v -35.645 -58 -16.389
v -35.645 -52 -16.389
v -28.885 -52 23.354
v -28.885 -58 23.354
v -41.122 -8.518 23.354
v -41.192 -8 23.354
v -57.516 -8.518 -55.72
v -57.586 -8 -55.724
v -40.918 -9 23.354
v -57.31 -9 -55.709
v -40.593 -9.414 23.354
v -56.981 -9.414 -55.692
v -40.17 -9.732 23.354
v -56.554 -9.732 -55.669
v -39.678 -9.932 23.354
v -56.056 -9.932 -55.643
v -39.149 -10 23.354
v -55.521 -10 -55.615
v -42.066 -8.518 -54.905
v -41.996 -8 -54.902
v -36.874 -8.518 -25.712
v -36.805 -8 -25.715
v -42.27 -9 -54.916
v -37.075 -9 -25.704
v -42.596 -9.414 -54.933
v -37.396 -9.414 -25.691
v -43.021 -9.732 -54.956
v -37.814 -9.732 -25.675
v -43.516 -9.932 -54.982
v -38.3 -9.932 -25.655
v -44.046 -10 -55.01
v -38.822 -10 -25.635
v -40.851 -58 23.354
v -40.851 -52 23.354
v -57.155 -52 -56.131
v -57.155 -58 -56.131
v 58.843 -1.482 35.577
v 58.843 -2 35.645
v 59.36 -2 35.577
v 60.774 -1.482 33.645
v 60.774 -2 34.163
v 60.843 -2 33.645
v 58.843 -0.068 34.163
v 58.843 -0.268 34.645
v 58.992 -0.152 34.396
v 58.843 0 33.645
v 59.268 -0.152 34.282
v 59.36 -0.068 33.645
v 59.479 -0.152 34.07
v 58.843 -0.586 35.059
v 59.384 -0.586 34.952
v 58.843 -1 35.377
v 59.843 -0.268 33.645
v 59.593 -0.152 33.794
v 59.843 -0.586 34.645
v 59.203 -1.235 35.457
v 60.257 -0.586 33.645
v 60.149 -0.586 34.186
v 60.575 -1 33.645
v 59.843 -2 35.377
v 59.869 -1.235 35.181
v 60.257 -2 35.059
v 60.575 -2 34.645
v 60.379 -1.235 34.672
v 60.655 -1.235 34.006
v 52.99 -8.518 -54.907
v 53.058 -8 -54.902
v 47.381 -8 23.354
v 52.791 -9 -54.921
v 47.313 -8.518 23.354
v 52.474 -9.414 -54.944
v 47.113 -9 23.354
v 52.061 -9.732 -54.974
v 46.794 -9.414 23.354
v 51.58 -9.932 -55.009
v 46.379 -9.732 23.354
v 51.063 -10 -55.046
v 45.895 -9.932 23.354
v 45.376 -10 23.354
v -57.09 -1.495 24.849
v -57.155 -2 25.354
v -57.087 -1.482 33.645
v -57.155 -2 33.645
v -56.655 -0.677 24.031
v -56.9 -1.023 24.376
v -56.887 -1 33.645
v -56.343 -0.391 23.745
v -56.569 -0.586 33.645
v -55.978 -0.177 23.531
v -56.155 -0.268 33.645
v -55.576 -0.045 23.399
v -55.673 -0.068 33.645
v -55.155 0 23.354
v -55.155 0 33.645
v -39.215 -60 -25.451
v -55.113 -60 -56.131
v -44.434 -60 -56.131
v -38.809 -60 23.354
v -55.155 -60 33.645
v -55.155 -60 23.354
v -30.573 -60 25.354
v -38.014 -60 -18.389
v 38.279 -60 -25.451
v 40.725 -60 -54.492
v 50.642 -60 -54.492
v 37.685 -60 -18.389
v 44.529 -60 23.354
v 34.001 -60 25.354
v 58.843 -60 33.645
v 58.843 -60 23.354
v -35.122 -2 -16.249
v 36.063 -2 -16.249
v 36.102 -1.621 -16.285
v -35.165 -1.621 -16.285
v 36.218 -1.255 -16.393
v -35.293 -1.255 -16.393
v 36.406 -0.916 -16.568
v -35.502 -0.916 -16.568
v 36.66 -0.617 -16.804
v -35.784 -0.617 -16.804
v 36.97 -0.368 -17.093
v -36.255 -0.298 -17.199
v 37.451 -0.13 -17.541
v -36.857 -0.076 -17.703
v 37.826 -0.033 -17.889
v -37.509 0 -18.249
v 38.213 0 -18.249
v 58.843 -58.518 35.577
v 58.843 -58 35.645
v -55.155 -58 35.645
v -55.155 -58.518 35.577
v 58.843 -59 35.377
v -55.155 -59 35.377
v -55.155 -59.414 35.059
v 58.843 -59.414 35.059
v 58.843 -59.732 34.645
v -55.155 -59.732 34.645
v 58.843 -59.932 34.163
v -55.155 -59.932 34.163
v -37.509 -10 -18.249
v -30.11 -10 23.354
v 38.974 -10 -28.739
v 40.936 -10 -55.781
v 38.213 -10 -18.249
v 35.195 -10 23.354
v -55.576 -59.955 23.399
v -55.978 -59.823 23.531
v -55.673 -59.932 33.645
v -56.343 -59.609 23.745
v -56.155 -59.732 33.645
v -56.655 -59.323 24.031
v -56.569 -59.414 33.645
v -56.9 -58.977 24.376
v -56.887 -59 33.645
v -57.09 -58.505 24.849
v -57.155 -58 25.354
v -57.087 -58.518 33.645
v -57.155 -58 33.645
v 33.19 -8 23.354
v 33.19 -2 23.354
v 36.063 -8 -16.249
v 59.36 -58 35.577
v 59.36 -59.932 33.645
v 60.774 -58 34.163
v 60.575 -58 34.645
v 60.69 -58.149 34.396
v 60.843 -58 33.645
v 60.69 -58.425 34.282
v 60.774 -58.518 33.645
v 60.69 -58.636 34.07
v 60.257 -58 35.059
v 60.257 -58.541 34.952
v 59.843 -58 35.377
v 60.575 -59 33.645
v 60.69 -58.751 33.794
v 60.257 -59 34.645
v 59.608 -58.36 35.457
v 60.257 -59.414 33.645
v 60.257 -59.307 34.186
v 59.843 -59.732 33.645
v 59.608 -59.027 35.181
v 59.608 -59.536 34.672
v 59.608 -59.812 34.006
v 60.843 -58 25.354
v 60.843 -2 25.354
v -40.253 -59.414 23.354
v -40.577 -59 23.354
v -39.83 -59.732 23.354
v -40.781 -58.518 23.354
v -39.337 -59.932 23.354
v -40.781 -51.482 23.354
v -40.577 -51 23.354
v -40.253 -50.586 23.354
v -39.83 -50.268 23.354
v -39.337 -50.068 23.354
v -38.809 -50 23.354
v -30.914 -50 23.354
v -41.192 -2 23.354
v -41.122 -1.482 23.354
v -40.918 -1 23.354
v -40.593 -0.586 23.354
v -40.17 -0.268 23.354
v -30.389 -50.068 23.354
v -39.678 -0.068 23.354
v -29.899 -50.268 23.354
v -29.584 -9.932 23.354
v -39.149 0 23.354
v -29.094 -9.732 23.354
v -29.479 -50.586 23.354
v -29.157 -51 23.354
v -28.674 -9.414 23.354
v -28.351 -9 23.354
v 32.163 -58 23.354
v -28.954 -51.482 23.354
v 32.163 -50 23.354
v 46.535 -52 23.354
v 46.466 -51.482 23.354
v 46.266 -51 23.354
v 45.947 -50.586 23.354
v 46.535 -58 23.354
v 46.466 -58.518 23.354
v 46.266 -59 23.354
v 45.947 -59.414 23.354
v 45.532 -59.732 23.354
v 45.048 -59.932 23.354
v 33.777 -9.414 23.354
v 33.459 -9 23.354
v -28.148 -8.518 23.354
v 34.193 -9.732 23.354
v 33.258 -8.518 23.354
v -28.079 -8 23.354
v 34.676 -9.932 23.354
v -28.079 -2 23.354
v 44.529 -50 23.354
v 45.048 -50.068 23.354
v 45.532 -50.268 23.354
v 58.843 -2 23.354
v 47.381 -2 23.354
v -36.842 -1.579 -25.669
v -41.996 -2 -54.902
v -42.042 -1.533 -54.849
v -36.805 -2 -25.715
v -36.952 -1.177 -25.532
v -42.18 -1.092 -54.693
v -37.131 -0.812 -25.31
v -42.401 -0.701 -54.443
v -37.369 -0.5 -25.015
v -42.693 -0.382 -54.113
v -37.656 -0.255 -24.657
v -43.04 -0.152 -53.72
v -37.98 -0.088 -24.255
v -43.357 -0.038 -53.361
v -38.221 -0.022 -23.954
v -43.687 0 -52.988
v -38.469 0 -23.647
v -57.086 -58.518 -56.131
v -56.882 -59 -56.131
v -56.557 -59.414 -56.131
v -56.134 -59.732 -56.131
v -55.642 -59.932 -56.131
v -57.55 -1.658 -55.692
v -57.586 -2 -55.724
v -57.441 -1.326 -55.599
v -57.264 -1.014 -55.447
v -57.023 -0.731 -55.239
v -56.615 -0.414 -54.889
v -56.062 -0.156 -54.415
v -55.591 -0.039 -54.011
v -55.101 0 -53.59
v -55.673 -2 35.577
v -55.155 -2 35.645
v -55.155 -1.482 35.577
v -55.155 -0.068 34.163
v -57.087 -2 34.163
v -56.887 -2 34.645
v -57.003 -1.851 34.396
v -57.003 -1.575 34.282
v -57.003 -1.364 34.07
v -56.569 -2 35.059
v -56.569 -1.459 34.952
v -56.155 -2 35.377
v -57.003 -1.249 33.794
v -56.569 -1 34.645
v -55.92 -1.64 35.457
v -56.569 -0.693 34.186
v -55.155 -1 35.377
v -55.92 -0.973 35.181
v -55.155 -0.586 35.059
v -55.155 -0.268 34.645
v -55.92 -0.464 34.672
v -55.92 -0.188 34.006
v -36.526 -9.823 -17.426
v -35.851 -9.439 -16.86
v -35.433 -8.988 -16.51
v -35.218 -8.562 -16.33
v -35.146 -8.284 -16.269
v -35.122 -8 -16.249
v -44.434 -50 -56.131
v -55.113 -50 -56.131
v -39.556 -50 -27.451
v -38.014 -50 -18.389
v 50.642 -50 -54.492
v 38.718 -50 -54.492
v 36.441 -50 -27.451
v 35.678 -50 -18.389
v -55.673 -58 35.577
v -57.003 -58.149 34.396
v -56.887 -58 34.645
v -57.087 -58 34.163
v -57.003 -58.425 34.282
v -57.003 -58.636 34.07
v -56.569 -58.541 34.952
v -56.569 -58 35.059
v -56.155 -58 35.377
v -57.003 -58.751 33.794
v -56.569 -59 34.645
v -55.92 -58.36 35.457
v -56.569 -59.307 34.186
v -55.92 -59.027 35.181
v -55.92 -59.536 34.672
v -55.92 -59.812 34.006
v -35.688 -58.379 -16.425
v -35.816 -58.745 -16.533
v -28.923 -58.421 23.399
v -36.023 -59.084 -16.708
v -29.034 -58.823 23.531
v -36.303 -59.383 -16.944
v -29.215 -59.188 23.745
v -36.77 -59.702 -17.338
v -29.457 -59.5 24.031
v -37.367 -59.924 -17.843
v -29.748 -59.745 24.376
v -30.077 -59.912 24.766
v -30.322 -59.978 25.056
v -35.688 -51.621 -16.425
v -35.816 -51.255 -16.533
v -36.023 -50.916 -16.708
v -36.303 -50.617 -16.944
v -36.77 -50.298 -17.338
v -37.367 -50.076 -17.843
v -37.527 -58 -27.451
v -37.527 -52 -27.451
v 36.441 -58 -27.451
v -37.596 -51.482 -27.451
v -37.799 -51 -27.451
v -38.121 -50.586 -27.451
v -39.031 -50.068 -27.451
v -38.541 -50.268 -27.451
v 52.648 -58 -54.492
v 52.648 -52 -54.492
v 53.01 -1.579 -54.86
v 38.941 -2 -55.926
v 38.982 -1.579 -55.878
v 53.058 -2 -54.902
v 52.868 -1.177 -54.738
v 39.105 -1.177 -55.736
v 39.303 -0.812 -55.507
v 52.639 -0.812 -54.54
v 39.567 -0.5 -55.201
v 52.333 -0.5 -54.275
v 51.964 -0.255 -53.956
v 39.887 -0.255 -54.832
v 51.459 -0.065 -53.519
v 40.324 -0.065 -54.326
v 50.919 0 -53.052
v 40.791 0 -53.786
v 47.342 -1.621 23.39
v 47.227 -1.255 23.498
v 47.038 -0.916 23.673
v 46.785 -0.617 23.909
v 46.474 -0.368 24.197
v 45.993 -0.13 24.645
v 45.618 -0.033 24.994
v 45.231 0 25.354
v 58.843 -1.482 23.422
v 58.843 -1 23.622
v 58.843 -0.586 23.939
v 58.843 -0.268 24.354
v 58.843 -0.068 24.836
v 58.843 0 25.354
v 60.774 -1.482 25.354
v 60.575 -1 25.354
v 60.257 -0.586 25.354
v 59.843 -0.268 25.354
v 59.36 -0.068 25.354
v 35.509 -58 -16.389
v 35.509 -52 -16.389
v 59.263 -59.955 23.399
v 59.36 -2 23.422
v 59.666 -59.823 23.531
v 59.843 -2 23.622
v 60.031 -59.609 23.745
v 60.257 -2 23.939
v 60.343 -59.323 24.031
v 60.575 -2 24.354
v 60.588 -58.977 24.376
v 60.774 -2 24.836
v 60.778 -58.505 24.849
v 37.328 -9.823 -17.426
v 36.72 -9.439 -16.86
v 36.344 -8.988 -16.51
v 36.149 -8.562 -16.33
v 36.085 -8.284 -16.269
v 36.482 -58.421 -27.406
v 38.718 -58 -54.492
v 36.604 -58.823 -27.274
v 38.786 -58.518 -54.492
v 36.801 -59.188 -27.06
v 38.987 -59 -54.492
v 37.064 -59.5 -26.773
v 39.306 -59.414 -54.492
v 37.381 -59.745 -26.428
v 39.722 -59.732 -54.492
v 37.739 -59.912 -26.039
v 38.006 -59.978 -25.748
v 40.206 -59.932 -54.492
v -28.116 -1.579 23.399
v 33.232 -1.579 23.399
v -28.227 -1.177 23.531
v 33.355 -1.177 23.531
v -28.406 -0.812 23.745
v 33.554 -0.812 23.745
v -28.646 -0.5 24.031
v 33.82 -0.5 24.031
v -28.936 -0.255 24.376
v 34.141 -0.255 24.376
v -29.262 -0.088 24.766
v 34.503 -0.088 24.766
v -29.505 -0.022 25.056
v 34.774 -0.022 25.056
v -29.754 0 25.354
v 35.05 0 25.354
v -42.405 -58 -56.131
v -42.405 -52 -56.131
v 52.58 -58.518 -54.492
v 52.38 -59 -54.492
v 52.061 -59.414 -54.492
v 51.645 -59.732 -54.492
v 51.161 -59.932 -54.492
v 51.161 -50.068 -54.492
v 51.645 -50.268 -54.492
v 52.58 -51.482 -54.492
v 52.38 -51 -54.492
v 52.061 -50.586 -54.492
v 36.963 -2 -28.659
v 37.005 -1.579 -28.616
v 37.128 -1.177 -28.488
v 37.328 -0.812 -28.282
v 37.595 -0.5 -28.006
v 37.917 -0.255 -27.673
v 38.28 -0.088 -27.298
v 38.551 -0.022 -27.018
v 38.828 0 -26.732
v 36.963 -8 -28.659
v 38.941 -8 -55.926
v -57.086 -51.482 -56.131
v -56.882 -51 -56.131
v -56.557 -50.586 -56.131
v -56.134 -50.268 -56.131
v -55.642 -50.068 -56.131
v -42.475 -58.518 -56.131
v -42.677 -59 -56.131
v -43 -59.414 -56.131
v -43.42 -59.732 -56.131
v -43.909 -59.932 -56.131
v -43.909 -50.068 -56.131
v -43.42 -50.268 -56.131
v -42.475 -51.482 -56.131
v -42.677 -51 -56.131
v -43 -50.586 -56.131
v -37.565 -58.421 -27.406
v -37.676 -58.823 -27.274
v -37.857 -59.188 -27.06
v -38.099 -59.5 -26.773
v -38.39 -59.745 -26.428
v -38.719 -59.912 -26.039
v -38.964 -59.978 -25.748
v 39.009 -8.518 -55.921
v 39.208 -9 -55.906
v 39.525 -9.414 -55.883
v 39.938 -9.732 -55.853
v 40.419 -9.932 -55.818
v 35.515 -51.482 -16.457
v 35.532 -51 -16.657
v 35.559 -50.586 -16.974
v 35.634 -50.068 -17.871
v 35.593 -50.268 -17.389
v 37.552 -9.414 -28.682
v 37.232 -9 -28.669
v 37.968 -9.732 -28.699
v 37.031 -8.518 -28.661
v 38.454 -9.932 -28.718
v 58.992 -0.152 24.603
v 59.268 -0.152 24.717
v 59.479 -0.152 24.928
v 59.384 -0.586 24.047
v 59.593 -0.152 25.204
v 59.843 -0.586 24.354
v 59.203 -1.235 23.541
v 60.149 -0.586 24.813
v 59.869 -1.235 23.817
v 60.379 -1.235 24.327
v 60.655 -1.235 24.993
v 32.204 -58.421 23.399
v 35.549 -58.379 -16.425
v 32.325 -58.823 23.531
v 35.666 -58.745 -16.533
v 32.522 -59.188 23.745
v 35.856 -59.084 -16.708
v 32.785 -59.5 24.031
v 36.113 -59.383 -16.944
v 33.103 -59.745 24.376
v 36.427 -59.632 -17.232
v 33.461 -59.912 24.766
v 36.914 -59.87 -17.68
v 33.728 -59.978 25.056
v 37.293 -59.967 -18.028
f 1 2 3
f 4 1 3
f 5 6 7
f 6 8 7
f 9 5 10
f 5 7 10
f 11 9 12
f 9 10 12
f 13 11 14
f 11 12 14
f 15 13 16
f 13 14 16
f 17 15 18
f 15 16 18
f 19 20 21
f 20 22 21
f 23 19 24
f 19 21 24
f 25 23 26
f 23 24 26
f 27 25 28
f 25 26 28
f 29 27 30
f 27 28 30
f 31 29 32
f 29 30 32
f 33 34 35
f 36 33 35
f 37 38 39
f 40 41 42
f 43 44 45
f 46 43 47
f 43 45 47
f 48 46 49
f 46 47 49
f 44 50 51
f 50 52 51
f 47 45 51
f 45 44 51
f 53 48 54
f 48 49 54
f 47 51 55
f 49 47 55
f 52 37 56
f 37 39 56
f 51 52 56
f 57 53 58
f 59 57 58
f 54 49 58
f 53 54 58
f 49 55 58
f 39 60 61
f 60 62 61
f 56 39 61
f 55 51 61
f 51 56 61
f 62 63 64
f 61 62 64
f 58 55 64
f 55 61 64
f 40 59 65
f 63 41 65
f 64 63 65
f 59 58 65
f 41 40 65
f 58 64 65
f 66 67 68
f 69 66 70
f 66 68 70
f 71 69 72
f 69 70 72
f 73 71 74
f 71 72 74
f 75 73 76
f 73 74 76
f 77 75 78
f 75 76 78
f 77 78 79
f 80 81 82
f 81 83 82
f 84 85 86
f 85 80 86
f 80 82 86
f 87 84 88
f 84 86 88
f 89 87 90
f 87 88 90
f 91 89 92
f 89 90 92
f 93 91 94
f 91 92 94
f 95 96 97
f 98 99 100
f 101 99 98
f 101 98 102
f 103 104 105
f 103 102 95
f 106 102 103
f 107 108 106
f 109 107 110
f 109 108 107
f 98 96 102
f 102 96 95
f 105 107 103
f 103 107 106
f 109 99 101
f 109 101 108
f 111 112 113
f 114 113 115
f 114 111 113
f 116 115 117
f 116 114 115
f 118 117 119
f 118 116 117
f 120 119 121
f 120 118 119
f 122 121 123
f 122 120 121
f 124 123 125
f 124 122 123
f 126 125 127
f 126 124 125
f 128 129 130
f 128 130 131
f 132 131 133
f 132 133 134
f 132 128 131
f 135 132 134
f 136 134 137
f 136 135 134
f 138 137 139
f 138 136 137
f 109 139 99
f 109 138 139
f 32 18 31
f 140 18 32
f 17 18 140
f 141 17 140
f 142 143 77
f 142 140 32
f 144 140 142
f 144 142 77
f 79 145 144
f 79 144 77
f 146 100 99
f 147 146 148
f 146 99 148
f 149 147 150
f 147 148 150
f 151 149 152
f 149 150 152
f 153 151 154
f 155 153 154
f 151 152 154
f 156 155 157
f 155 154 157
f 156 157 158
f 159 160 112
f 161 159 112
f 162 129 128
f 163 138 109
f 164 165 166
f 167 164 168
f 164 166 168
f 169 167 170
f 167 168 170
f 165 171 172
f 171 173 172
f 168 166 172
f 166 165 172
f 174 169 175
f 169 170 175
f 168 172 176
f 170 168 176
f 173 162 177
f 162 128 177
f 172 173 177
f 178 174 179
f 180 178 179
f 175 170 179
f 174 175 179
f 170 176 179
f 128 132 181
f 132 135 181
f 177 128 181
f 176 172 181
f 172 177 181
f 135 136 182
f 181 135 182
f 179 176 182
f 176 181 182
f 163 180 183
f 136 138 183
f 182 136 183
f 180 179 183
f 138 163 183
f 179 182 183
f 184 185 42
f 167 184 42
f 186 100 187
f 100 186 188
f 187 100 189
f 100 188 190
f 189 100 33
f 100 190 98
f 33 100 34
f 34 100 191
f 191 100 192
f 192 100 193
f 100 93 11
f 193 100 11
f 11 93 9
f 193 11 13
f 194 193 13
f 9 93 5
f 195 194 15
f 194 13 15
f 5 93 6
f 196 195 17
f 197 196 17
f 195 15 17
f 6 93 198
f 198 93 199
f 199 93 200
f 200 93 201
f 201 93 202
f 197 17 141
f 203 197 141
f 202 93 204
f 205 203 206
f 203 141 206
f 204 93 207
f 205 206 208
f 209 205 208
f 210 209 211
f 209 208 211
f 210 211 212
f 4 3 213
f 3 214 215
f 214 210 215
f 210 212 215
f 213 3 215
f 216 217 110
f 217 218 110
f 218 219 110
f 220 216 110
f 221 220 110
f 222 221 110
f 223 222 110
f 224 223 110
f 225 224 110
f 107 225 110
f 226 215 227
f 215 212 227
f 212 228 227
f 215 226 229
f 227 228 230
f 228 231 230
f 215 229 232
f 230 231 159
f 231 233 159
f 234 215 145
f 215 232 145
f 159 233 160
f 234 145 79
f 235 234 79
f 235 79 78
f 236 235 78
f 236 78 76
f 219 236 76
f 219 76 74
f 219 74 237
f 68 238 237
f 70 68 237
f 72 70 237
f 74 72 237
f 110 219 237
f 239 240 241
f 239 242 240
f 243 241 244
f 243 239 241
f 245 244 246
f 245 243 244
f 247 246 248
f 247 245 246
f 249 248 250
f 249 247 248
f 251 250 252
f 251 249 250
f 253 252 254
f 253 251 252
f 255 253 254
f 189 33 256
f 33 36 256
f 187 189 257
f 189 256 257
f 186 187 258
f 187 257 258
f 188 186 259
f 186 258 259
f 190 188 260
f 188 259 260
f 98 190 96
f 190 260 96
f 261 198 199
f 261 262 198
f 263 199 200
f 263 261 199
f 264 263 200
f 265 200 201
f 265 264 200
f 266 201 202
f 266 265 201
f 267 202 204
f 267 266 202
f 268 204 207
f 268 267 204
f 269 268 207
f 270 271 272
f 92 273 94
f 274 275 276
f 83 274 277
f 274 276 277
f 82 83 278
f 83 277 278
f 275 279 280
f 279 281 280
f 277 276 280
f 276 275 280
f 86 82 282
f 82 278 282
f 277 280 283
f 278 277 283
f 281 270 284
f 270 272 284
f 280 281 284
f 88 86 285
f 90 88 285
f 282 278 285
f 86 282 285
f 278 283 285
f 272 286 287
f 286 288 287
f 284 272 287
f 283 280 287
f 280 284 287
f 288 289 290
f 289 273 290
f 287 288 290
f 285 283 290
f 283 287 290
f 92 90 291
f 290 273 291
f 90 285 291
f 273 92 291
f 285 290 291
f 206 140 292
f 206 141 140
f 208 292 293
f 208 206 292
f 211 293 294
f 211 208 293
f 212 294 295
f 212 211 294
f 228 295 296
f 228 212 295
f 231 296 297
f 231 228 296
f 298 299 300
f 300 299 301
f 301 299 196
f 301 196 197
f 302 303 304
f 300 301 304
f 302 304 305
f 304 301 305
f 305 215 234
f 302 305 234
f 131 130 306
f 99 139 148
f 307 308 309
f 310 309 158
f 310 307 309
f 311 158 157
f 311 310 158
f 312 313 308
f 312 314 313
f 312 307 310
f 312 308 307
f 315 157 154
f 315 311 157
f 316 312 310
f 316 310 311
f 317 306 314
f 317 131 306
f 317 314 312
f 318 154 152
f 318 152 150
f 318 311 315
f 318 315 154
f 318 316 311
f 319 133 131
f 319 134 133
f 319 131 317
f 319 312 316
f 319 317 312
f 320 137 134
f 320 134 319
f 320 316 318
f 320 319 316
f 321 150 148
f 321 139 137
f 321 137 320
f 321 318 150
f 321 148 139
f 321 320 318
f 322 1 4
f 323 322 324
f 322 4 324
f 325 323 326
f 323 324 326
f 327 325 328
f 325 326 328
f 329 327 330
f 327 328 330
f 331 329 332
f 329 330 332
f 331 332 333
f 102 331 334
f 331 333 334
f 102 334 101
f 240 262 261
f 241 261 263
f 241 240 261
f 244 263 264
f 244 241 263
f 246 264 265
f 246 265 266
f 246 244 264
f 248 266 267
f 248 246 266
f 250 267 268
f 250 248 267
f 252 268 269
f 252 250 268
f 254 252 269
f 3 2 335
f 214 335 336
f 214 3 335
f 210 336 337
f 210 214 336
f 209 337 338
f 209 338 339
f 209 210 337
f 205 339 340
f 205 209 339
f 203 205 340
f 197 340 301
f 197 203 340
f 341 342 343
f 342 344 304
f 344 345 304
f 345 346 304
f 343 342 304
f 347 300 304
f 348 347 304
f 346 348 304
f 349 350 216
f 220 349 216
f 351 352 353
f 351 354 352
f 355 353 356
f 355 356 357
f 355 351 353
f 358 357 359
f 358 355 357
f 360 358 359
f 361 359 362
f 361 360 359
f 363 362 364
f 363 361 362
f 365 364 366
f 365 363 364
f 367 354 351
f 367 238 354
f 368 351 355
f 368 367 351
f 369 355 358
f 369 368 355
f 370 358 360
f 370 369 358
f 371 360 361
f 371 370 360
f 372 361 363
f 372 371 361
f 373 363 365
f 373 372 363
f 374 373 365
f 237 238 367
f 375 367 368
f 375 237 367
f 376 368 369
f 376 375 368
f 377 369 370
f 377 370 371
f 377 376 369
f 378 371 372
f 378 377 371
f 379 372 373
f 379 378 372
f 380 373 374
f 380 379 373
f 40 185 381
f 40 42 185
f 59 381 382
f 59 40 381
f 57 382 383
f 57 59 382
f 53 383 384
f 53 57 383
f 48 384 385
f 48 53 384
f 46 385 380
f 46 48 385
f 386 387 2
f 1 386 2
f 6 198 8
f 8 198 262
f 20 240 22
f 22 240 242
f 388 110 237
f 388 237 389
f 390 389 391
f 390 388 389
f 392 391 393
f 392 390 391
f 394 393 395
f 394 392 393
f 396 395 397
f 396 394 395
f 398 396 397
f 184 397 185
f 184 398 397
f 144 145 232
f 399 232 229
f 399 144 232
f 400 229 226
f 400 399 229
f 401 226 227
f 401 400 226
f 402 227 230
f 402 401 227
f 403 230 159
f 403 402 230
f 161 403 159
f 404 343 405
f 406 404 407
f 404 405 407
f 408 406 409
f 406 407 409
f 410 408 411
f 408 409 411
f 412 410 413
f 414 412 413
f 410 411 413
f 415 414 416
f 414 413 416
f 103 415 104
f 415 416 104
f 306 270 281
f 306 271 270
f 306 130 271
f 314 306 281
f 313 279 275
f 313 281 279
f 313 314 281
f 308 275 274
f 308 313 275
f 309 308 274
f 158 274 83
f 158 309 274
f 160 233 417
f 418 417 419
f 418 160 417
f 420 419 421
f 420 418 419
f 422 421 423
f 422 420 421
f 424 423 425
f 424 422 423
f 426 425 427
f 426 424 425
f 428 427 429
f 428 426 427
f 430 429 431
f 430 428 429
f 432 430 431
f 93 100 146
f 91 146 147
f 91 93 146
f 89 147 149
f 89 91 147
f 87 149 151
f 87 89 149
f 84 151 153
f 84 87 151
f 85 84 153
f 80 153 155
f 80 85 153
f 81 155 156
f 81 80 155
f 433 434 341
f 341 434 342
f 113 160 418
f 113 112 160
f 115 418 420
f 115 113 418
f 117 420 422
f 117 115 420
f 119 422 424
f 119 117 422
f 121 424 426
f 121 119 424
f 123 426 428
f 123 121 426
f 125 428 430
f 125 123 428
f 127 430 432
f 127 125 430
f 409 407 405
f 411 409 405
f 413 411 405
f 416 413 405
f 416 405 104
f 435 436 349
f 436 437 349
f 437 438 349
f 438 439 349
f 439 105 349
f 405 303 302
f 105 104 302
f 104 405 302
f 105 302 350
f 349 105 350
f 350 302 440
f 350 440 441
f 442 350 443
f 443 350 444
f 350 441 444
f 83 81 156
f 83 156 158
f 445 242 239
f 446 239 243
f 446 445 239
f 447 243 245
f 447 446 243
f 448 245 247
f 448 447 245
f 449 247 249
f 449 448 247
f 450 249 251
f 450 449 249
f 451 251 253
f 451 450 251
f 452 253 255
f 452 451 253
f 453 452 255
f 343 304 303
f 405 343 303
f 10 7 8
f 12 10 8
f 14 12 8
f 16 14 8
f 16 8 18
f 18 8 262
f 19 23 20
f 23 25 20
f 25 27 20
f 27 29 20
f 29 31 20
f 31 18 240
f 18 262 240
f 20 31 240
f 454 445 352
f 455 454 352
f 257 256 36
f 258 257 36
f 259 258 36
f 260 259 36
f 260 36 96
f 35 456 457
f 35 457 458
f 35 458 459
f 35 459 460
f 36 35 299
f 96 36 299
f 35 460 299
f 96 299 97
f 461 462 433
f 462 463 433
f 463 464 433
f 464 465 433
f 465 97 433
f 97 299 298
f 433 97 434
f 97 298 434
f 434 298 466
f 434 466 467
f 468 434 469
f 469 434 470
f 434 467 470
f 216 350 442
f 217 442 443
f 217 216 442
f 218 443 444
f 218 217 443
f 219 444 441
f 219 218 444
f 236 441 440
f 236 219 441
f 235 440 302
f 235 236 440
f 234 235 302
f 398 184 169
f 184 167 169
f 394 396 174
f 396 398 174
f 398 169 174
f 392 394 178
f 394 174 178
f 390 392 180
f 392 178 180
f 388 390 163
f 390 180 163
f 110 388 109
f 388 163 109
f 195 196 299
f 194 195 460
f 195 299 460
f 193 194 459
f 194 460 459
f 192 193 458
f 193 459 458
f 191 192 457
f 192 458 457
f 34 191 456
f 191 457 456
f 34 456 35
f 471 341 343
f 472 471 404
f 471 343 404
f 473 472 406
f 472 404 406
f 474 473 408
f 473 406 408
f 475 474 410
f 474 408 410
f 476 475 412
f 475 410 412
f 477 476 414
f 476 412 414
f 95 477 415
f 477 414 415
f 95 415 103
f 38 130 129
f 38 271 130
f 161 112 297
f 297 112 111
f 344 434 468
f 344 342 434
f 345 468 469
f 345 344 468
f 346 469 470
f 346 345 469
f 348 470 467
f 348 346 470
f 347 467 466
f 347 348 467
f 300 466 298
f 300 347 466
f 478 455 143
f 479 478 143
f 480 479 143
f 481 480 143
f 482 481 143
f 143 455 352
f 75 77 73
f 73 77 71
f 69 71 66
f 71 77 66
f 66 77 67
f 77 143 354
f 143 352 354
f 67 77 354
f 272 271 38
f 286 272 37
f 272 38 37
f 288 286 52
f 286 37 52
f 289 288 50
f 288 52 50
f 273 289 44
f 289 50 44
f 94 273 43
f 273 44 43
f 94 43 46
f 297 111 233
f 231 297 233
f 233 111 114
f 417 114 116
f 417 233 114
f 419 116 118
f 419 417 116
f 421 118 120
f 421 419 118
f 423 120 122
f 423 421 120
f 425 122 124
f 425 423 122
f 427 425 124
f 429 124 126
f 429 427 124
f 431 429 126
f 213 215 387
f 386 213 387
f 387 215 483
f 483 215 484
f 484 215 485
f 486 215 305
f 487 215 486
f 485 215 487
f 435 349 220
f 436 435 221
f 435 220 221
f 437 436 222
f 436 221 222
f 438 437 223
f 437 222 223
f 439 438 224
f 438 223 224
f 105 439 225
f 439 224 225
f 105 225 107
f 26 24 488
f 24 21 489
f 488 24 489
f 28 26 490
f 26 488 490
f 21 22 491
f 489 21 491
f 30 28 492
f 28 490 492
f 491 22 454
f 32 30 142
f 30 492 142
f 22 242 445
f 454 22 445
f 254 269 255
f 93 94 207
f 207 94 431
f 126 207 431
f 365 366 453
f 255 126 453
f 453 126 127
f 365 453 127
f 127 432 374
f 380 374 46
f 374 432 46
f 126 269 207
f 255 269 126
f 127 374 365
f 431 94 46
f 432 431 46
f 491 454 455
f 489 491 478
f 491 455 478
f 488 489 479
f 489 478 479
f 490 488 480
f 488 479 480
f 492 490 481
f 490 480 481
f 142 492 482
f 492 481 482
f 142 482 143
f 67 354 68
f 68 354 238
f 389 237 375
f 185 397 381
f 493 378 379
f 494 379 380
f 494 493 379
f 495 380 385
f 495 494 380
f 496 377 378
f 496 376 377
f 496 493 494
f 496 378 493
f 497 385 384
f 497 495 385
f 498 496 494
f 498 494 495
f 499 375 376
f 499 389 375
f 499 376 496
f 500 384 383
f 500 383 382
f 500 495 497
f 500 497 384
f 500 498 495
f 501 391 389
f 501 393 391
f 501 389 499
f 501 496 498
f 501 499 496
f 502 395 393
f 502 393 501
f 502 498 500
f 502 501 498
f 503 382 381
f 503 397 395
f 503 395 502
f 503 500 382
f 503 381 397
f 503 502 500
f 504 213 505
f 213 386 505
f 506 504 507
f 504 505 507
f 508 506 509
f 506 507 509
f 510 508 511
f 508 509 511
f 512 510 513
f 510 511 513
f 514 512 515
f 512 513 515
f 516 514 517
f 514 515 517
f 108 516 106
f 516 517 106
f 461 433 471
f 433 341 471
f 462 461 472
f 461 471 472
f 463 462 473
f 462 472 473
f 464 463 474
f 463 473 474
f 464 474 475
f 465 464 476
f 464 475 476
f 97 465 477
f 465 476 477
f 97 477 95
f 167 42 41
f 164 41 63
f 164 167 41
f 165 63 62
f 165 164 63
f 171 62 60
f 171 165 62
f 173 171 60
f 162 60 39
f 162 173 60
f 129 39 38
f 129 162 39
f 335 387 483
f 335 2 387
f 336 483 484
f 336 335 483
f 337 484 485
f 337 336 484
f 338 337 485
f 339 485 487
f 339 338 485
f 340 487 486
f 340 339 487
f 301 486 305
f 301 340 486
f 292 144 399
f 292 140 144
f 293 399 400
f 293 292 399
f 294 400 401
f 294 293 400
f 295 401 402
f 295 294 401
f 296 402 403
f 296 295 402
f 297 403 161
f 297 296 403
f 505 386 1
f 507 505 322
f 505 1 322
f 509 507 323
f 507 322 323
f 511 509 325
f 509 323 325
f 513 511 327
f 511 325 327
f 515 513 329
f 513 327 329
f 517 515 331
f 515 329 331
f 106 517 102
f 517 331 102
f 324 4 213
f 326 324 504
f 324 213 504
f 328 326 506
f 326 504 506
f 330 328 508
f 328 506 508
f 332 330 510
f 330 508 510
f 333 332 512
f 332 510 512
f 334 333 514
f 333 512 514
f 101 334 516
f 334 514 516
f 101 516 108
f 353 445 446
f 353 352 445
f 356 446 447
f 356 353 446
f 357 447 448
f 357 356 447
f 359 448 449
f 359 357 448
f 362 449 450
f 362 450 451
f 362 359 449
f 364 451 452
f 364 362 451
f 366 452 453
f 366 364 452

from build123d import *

# Parameters (mm, degrees)
F0_W          = 117.9976798594
F0_H          = 12.2914258391
F1_DEPTH      = 60
F4_DEPTH      = 10
F6_DEPTH      = 10
F7_W          = 39.3325621262
F7_H          = 90.9565519542
F8_DEPTH      = 57.5873161514
F8_DEPTH_BACK = 100
F9_R          = 2


with BuildPart() as f1:
    # F0 (on Front) → F1 (new body)
    with BuildSketch(Plane.XZ):
        with Locations((1.843707636, 29.4994218275)):
            Rectangle(F0_W, F0_H)
    extrude(amount=F1_DEPTH)

    # F3 (on offset) → F4 (join)
    with BuildSketch(Plane.XZ.offset(50)):
        Polygon((-28.8848504424, 23.353708908), (-40.7665632665, 23.7634219229), (-57.1551285684, -56.1308450997), (-42.4054190516, -56.1308450997), (-37.5268632135, -27.4508504777), (-35.645134747, -16.3885680959), align=None)
        Polygon((35.509279896, -16.3885680959), (-35.645134747, -16.3885680959), (-37.5268632135, -27.4508504777), (36.4408404675, -27.4508504777), align=None)
        Polygon((32.1625620127, 23.353708908), (35.509279896, -16.3885680959), (36.4408404675, -27.4508504777), (38.7179888785, -54.4919893146), (52.6482760906, -54.4919893146), (46.5025603771, 23.7634219229), align=None)
    extrude(amount=F4_DEPTH)

    # F5 (on Front) → F6 (join)
    with BuildSketch(Plane.XZ):
        Polygon((53.0579872429, -54.9017004669), (47.321986407, 24.1731368005), (33.1846513491, 23.4278501328), (36.0627619886, -16.2489450714), (36.7494194461, -25.7150048338), (36.9629519862, -28.6587022527), (38.9408726281, -55.9257402756), align=None)
        Polygon((36.7494194461, -25.7150048338), (36.0627619886, -16.2489450714), (-35.1216238776, -16.2489450714), (-36.8050870485, -25.7150048338), (36.9629519862, -28.6587022527), align=None)
        Polygon((-36.8050870485, -25.7150048338), (-35.1216238776, -16.2489450714), (-28.0654225498, 23.4278501328), (-41.1762744188, 23.4278501328), (-57.5863161514, -55.7236002397), (-41.9957078993, -54.9017004669), align=None)
    extrude(amount=F6_DEPTH)

    # F7 (on Right) → F8 (cut, two sides)
    with BuildSketch(Plane.YZ) as f8_sk:
        with Locations((-30.1139908843, -22.1245670691)):
            Rectangle(F7_W, F7_H)
    extrude(amount=-F8_DEPTH, mode=Mode.SUBTRACT)
    extrude(f8_sk.sketch, amount=F8_DEPTH_BACK, mode=Mode.SUBTRACT)

    # F9
    f9_edges = [f1.edges().sort_by_distance(p)[0] for p in [
        (1.843708, -60, 35.645135),
        (1.638856, -60, 23.353709),
        (-32.264993, -60, 3.48257),
        (33.835921, -60, 3.48257),
        (-0.067927, -60, -16.388568),
        (-0.543011, -60, -27.45085),
        (37.579415, -60, -40.97142),
        (49.591506, -60, -15.56914),
        (49.591506, -50, -15.56914),
        (60.842548, -30, 23.353709),
        (60.842548, -30, 35.645135),
        (1.843708, 0, 35.645135),
        (2.555711, 0, 23.353709),
        (54.111987, 0, 23.353709),
        (-57.155132, -30, 35.645135),
        (-57.155132, -30, 23.353709),
        (-57.155132, -60, 29.499422),
        (-57.155132, 0, 29.499422),
        (60.842548, 0, 29.499422),
        (60.842548, -60, 29.499422),
        (50.219707, 0, -15.773996),
        (-49.388981, 0, -16.184946),
        (-49.002868, -50, -16.388568),
        (-39.400397, 0, -40.308353),
        (-49.791012, 0, -55.31265),
        (0.078932, 0, -27.186854),
        (37.951912, 0, -42.292221),
        (45.99943, 0, -55.41372),
        (34.626396, 0, 3.552382),
        (0.470569, 0, -16.248945),
        (-31.600116, 0, 3.552382),
        (-31.600116, -10, 3.552382),
        (-39.400397, -10, -40.308353),
        (-39.966141, -60, -41.790848),
        (34.626396, -10, 3.552382),
        (50.219707, -10, -15.773996),
        (-49.002868, -60, -16.388568),
        (0.470569, -10, -16.248945),
        (-0.067927, -50, -16.388568),
        (-32.264993, -50, 3.48257),
        (-49.388981, -10, -16.184946),
        (-39.966141, -50, -41.790848),
        (37.951912, -10, -42.292221),
    ]]
    fillet(f9_edges, radius=F9_R)


solid = f1.part
